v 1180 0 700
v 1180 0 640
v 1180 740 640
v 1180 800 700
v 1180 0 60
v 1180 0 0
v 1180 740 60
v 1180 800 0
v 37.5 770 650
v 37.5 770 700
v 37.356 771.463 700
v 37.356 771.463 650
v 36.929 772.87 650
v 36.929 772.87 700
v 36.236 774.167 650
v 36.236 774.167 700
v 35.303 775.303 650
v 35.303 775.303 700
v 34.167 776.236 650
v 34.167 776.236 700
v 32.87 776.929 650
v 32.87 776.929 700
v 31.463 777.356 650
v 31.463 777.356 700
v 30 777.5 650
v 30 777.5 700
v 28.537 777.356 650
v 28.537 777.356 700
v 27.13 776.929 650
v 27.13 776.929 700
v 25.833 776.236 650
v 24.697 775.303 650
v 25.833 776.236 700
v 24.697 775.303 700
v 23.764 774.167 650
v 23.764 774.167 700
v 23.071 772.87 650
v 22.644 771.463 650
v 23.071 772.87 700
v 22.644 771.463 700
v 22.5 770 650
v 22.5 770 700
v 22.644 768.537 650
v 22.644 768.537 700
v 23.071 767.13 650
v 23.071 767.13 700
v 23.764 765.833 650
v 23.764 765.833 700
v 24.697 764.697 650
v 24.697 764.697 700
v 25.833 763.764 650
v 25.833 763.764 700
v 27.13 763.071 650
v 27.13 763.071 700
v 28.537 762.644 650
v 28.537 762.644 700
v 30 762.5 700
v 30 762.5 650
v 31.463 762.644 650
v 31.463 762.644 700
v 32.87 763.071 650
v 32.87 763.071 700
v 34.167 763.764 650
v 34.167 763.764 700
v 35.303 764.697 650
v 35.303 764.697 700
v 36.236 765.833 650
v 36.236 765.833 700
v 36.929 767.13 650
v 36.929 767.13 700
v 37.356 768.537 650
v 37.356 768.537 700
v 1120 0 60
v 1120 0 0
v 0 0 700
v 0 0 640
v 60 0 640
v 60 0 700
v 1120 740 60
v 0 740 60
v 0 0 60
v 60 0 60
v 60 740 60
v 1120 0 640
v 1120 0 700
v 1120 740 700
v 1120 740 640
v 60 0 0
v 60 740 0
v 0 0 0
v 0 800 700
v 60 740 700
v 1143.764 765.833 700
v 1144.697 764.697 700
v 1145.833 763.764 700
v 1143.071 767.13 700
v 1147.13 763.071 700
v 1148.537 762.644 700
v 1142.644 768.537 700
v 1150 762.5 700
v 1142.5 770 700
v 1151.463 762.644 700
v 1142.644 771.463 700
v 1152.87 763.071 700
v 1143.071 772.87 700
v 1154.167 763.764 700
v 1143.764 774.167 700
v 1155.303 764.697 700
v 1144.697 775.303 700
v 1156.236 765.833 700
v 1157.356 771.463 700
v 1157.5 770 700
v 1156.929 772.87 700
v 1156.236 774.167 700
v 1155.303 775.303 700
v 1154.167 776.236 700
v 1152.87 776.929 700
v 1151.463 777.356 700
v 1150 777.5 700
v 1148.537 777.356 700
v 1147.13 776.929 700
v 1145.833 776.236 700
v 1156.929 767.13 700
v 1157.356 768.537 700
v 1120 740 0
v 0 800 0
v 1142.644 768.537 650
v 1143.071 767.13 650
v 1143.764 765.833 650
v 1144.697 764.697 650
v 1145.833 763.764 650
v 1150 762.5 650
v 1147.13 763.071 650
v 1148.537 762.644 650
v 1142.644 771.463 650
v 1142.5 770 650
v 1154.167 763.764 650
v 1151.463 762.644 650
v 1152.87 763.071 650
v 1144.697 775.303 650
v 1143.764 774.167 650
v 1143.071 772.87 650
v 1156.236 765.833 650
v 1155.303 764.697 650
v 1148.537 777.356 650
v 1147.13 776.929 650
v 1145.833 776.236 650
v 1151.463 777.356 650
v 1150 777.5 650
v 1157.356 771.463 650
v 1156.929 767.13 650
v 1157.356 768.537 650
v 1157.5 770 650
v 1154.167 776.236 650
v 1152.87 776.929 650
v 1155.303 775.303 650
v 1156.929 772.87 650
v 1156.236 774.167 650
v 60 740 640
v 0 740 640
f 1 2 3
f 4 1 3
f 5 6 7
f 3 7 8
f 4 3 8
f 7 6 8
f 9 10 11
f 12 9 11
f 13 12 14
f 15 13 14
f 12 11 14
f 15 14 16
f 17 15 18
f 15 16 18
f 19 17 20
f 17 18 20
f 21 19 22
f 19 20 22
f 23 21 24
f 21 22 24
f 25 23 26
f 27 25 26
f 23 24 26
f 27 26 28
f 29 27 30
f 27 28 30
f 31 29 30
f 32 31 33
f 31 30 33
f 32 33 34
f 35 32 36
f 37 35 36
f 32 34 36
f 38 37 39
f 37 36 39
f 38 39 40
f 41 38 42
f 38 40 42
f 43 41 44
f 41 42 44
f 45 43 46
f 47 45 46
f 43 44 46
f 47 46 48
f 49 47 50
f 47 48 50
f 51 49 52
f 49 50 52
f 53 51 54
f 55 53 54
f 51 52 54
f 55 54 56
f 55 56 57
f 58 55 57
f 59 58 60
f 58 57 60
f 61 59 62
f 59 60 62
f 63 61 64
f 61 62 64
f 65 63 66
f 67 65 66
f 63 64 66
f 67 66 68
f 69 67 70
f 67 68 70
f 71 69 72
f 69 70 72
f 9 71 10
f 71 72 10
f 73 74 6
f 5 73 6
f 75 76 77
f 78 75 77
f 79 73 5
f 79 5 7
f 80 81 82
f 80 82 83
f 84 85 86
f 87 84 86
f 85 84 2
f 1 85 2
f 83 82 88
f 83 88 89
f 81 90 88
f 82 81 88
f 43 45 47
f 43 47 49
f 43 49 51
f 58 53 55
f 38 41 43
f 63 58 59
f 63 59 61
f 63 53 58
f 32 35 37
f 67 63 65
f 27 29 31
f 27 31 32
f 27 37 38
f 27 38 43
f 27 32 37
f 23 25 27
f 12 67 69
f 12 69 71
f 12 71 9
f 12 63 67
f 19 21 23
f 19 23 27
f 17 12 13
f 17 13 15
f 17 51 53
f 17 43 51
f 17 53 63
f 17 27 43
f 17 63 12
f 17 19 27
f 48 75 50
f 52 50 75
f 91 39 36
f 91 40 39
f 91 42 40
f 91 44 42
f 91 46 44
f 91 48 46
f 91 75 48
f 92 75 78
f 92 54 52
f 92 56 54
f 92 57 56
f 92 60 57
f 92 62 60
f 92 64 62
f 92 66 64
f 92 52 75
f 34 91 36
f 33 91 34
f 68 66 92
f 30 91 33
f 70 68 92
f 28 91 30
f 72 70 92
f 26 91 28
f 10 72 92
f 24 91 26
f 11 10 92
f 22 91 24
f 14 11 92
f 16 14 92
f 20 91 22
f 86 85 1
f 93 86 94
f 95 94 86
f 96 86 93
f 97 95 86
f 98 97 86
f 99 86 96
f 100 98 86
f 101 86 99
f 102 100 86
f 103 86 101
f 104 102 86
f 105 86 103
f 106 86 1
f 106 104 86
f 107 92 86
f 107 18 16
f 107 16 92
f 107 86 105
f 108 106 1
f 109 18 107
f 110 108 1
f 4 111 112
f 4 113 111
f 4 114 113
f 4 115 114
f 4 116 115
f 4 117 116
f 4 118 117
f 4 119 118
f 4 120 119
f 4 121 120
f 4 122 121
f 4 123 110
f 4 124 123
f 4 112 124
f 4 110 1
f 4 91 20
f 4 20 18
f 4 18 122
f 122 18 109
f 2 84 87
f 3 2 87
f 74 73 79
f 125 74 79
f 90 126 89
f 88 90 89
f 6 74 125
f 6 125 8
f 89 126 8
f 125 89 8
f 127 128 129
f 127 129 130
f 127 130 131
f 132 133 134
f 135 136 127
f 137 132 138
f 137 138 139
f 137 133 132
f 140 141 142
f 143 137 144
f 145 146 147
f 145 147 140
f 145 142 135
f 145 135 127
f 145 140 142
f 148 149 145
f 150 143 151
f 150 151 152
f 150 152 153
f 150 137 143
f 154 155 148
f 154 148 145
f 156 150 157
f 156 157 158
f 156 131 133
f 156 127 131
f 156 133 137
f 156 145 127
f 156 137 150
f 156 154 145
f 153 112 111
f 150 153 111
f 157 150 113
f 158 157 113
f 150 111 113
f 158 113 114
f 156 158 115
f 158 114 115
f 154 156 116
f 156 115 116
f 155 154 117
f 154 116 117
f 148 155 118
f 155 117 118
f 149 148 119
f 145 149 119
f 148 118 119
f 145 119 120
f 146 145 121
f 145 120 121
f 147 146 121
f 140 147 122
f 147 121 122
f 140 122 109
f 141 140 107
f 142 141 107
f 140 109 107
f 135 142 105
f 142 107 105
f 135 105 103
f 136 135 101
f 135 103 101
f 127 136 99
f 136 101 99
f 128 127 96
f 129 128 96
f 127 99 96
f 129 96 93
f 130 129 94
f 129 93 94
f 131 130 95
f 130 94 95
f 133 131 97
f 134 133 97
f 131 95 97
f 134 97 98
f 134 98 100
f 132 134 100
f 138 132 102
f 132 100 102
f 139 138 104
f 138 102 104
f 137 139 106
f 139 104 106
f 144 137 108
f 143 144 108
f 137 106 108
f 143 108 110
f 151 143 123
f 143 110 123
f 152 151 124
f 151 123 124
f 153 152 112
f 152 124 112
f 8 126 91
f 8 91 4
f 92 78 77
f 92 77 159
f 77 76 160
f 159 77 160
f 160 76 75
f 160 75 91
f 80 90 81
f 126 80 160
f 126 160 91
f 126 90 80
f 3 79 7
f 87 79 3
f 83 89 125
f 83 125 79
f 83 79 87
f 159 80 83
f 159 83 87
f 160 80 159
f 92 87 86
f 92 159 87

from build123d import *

# Parameters (mm, degrees)
ESQUISSE1_W             = 1180
ESQUISSE1_H             = 800
BOSS_EXTRU_1_DEPTH      = 700
ESQUISSE2_W             = 1060
ESQUISSE2_H             = 740
ENL_V_MAT_EXTRU_1_DEPTH = 700
ESQUISSE3_W             = 580
ESQUISSE3_H             = 740
ENL_V_MAT_EXTRU_2_DEPTH = 1240
ESQUISSE7_R             = 7.5
ENL_V_MAT_EXTRU_5_DEPTH = 50


with BuildPart() as part:
    # Esquisse1 → Boss.-Extru.1 (new body)
    with BuildSketch(Plane.XY):
        with Locations((590, 400)):
            Rectangle(ESQUISSE1_W, ESQUISSE1_H)
    extrude(amount=BOSS_EXTRU_1_DEPTH)

    # Esquisse2 → Enlèv. mat.-Extru.1 (cut)
    with BuildSketch(Plane.XY.offset(700)):
        with Locations((590, 370)):
            Rectangle(ESQUISSE2_W, ESQUISSE2_H)
    extrude(amount=-ENL_V_MAT_EXTRU_1_DEPTH, mode=Mode.SUBTRACT)

    # Esquisse3 → Enlèv. mat.-Extru.2 (cut)
    with BuildSketch(Plane.ZY):
        with Locations((350, 370)):
            Rectangle(ESQUISSE3_W, ESQUISSE3_H)
    extrude(amount=-ENL_V_MAT_EXTRU_2_DEPTH, mode=Mode.SUBTRACT)

    # Esquisse7 → Enlèv. mat.-Extru.5 (cut)
    with BuildSketch(Plane.XY.offset(700)):
        with Locations((30, 770)):
            Circle(ESQUISSE7_R)
        with Locations((1150, 770)):
            Circle(ESQUISSE7_R)
    extrude(amount=-ENL_V_MAT_EXTRU_5_DEPTH, mode=Mode.SUBTRACT)


solid = part.part
